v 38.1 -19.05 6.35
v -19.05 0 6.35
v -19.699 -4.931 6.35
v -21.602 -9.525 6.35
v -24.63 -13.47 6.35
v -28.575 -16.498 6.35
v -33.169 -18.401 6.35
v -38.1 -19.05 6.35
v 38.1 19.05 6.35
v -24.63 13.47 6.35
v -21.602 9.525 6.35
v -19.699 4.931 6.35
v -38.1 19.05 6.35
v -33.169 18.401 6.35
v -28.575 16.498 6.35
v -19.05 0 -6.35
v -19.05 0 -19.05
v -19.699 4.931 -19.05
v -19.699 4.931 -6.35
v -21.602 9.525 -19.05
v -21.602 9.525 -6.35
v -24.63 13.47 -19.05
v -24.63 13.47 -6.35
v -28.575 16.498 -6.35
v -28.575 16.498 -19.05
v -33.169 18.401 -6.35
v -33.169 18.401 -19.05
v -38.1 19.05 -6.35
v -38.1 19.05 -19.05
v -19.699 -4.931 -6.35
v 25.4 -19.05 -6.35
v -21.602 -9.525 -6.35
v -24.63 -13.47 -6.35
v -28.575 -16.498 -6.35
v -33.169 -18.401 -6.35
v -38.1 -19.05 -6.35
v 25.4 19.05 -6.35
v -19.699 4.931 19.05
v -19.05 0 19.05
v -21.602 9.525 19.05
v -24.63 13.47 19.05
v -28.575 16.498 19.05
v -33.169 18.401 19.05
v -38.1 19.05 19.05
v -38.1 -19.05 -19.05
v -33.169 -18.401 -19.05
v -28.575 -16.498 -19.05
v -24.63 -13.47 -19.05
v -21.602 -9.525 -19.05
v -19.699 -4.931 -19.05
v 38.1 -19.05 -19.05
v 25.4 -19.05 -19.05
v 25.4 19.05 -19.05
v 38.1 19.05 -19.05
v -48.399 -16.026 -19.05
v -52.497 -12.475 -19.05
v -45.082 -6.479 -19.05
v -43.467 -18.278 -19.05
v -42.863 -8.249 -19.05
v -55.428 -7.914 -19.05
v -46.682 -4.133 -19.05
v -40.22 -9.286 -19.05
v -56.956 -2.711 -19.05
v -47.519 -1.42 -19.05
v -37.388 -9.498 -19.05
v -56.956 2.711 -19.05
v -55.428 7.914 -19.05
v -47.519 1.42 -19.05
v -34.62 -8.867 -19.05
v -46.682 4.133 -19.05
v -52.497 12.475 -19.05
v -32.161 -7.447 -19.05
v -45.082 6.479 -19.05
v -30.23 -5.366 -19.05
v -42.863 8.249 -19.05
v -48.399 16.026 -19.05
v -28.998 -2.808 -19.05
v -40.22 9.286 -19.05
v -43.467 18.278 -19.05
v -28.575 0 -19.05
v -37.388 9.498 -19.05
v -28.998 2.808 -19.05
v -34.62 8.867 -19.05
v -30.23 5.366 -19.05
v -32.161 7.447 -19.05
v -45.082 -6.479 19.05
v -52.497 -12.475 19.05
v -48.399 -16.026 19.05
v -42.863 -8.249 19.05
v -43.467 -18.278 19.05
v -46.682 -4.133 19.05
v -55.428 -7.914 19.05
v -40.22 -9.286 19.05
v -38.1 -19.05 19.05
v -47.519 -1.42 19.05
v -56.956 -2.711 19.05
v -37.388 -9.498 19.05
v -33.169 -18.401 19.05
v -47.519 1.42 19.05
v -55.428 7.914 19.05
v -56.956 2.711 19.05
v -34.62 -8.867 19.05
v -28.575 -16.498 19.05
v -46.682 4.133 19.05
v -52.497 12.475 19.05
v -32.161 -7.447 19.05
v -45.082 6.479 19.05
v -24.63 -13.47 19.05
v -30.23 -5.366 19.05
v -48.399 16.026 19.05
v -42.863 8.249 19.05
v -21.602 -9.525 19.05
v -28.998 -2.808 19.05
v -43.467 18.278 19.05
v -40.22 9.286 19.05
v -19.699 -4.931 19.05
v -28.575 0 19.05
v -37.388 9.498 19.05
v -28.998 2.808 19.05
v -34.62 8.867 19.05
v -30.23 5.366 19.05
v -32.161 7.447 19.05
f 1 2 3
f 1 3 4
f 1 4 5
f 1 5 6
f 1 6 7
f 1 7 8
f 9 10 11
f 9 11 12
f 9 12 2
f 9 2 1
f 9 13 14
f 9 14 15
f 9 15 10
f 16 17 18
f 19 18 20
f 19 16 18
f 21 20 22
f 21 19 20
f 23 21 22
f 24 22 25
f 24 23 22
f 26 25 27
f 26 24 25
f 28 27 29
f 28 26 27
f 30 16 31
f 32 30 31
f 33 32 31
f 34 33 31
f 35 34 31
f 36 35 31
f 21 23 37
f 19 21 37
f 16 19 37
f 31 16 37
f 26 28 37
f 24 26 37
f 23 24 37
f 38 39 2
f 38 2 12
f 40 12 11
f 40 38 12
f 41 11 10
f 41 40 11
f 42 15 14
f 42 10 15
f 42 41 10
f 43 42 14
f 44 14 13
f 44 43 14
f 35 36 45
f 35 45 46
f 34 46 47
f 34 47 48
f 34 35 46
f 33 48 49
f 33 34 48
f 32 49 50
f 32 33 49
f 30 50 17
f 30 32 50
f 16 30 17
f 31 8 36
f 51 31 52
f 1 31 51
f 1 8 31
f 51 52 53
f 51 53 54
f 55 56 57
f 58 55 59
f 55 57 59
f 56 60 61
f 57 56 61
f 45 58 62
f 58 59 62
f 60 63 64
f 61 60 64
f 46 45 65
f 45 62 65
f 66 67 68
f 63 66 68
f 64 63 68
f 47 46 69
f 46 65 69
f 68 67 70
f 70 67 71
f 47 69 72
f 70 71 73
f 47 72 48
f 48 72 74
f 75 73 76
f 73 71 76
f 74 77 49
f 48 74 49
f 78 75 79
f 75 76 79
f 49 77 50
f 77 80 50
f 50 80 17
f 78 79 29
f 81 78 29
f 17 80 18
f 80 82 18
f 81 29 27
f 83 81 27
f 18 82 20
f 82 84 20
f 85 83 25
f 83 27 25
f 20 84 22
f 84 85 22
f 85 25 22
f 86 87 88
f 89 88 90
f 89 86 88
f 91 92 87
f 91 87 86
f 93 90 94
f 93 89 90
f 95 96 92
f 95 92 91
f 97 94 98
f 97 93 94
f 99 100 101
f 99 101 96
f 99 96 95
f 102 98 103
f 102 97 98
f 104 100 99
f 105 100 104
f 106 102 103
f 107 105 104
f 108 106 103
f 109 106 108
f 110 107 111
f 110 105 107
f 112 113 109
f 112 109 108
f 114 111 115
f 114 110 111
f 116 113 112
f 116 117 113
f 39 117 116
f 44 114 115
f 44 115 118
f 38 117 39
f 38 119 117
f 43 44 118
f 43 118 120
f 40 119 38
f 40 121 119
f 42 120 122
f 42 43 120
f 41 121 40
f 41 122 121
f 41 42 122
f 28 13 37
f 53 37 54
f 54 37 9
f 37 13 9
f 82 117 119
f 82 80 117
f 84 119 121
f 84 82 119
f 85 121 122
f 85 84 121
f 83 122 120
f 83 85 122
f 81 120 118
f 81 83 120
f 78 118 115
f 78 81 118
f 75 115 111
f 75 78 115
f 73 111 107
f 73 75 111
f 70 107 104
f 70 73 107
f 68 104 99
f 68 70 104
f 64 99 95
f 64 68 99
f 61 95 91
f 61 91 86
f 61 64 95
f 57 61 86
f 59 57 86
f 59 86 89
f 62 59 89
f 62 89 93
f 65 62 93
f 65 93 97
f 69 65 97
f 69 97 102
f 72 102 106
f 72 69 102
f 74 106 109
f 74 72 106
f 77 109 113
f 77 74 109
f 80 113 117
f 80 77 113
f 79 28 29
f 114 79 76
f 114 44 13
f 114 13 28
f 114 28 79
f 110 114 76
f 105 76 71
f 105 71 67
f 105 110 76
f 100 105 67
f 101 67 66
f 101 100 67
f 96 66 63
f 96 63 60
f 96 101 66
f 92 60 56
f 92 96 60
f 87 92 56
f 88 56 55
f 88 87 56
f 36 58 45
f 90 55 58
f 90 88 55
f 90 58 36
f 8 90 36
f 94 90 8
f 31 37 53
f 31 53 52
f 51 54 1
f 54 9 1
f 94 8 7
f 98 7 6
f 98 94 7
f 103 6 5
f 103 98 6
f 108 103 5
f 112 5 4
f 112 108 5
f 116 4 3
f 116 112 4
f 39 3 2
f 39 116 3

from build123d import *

# Parameters (mm, degrees)
F0_R     = 9.525
F1_DEPTH = 19.05
F2_DEPTH = 6.35
F3_W     = 12.7
F3_H     = 38.1
F4_DEPTH = 12.7


with BuildPart() as f1:
    # F0 (on Top) → F1 (new body, symmetric)
    with BuildSketch(Plane.XY):
        with BuildLine():
            ThreePointArc((-38.1, 19.05), (-57.15, 0), (-38.1, -19.05))
            ThreePointArc((-38.1, -19.05), (-24.629616, -13.470384), (-19.05, 0))
            ThreePointArc((-19.05, 0), (-24.629616, 13.470384), (-38.1, 19.05))
        make_face()
        with Locations((-38.1, 0)):
            Circle(F0_R, mode=Mode.SUBTRACT)
    extrude(amount=F1_DEPTH, both=True)

    # F0 (on Top) → F2 (join, symmetric)
    with BuildSketch(Plane.XY):
        with BuildLine():
            Line((-38.1, -19.05), (38.1, -19.05))
            Line((38.1, -19.05), (38.1, 19.05))
            Line((38.1, 19.05), (-38.1, 19.05))
            ThreePointArc((-38.1, 19.05), (-24.629616, 13.470384), (-19.05, 0))
            ThreePointArc((-19.05, 0), (-24.629616, -13.470384), (-38.1, -19.05))
        make_face()
    extrude(amount=F2_DEPTH, both=True)

    # F3 (on face) → F4 (join)
    with BuildSketch(Plane(origin=(0, 0, -6.35), x_dir=(1, 0, 0), z_dir=(0, 0, -1))):
        with Locations((31.75, 0)):
            Rectangle(F3_W, F3_H)
    extrude(amount=F4_DEPTH)


solid = f1.part
